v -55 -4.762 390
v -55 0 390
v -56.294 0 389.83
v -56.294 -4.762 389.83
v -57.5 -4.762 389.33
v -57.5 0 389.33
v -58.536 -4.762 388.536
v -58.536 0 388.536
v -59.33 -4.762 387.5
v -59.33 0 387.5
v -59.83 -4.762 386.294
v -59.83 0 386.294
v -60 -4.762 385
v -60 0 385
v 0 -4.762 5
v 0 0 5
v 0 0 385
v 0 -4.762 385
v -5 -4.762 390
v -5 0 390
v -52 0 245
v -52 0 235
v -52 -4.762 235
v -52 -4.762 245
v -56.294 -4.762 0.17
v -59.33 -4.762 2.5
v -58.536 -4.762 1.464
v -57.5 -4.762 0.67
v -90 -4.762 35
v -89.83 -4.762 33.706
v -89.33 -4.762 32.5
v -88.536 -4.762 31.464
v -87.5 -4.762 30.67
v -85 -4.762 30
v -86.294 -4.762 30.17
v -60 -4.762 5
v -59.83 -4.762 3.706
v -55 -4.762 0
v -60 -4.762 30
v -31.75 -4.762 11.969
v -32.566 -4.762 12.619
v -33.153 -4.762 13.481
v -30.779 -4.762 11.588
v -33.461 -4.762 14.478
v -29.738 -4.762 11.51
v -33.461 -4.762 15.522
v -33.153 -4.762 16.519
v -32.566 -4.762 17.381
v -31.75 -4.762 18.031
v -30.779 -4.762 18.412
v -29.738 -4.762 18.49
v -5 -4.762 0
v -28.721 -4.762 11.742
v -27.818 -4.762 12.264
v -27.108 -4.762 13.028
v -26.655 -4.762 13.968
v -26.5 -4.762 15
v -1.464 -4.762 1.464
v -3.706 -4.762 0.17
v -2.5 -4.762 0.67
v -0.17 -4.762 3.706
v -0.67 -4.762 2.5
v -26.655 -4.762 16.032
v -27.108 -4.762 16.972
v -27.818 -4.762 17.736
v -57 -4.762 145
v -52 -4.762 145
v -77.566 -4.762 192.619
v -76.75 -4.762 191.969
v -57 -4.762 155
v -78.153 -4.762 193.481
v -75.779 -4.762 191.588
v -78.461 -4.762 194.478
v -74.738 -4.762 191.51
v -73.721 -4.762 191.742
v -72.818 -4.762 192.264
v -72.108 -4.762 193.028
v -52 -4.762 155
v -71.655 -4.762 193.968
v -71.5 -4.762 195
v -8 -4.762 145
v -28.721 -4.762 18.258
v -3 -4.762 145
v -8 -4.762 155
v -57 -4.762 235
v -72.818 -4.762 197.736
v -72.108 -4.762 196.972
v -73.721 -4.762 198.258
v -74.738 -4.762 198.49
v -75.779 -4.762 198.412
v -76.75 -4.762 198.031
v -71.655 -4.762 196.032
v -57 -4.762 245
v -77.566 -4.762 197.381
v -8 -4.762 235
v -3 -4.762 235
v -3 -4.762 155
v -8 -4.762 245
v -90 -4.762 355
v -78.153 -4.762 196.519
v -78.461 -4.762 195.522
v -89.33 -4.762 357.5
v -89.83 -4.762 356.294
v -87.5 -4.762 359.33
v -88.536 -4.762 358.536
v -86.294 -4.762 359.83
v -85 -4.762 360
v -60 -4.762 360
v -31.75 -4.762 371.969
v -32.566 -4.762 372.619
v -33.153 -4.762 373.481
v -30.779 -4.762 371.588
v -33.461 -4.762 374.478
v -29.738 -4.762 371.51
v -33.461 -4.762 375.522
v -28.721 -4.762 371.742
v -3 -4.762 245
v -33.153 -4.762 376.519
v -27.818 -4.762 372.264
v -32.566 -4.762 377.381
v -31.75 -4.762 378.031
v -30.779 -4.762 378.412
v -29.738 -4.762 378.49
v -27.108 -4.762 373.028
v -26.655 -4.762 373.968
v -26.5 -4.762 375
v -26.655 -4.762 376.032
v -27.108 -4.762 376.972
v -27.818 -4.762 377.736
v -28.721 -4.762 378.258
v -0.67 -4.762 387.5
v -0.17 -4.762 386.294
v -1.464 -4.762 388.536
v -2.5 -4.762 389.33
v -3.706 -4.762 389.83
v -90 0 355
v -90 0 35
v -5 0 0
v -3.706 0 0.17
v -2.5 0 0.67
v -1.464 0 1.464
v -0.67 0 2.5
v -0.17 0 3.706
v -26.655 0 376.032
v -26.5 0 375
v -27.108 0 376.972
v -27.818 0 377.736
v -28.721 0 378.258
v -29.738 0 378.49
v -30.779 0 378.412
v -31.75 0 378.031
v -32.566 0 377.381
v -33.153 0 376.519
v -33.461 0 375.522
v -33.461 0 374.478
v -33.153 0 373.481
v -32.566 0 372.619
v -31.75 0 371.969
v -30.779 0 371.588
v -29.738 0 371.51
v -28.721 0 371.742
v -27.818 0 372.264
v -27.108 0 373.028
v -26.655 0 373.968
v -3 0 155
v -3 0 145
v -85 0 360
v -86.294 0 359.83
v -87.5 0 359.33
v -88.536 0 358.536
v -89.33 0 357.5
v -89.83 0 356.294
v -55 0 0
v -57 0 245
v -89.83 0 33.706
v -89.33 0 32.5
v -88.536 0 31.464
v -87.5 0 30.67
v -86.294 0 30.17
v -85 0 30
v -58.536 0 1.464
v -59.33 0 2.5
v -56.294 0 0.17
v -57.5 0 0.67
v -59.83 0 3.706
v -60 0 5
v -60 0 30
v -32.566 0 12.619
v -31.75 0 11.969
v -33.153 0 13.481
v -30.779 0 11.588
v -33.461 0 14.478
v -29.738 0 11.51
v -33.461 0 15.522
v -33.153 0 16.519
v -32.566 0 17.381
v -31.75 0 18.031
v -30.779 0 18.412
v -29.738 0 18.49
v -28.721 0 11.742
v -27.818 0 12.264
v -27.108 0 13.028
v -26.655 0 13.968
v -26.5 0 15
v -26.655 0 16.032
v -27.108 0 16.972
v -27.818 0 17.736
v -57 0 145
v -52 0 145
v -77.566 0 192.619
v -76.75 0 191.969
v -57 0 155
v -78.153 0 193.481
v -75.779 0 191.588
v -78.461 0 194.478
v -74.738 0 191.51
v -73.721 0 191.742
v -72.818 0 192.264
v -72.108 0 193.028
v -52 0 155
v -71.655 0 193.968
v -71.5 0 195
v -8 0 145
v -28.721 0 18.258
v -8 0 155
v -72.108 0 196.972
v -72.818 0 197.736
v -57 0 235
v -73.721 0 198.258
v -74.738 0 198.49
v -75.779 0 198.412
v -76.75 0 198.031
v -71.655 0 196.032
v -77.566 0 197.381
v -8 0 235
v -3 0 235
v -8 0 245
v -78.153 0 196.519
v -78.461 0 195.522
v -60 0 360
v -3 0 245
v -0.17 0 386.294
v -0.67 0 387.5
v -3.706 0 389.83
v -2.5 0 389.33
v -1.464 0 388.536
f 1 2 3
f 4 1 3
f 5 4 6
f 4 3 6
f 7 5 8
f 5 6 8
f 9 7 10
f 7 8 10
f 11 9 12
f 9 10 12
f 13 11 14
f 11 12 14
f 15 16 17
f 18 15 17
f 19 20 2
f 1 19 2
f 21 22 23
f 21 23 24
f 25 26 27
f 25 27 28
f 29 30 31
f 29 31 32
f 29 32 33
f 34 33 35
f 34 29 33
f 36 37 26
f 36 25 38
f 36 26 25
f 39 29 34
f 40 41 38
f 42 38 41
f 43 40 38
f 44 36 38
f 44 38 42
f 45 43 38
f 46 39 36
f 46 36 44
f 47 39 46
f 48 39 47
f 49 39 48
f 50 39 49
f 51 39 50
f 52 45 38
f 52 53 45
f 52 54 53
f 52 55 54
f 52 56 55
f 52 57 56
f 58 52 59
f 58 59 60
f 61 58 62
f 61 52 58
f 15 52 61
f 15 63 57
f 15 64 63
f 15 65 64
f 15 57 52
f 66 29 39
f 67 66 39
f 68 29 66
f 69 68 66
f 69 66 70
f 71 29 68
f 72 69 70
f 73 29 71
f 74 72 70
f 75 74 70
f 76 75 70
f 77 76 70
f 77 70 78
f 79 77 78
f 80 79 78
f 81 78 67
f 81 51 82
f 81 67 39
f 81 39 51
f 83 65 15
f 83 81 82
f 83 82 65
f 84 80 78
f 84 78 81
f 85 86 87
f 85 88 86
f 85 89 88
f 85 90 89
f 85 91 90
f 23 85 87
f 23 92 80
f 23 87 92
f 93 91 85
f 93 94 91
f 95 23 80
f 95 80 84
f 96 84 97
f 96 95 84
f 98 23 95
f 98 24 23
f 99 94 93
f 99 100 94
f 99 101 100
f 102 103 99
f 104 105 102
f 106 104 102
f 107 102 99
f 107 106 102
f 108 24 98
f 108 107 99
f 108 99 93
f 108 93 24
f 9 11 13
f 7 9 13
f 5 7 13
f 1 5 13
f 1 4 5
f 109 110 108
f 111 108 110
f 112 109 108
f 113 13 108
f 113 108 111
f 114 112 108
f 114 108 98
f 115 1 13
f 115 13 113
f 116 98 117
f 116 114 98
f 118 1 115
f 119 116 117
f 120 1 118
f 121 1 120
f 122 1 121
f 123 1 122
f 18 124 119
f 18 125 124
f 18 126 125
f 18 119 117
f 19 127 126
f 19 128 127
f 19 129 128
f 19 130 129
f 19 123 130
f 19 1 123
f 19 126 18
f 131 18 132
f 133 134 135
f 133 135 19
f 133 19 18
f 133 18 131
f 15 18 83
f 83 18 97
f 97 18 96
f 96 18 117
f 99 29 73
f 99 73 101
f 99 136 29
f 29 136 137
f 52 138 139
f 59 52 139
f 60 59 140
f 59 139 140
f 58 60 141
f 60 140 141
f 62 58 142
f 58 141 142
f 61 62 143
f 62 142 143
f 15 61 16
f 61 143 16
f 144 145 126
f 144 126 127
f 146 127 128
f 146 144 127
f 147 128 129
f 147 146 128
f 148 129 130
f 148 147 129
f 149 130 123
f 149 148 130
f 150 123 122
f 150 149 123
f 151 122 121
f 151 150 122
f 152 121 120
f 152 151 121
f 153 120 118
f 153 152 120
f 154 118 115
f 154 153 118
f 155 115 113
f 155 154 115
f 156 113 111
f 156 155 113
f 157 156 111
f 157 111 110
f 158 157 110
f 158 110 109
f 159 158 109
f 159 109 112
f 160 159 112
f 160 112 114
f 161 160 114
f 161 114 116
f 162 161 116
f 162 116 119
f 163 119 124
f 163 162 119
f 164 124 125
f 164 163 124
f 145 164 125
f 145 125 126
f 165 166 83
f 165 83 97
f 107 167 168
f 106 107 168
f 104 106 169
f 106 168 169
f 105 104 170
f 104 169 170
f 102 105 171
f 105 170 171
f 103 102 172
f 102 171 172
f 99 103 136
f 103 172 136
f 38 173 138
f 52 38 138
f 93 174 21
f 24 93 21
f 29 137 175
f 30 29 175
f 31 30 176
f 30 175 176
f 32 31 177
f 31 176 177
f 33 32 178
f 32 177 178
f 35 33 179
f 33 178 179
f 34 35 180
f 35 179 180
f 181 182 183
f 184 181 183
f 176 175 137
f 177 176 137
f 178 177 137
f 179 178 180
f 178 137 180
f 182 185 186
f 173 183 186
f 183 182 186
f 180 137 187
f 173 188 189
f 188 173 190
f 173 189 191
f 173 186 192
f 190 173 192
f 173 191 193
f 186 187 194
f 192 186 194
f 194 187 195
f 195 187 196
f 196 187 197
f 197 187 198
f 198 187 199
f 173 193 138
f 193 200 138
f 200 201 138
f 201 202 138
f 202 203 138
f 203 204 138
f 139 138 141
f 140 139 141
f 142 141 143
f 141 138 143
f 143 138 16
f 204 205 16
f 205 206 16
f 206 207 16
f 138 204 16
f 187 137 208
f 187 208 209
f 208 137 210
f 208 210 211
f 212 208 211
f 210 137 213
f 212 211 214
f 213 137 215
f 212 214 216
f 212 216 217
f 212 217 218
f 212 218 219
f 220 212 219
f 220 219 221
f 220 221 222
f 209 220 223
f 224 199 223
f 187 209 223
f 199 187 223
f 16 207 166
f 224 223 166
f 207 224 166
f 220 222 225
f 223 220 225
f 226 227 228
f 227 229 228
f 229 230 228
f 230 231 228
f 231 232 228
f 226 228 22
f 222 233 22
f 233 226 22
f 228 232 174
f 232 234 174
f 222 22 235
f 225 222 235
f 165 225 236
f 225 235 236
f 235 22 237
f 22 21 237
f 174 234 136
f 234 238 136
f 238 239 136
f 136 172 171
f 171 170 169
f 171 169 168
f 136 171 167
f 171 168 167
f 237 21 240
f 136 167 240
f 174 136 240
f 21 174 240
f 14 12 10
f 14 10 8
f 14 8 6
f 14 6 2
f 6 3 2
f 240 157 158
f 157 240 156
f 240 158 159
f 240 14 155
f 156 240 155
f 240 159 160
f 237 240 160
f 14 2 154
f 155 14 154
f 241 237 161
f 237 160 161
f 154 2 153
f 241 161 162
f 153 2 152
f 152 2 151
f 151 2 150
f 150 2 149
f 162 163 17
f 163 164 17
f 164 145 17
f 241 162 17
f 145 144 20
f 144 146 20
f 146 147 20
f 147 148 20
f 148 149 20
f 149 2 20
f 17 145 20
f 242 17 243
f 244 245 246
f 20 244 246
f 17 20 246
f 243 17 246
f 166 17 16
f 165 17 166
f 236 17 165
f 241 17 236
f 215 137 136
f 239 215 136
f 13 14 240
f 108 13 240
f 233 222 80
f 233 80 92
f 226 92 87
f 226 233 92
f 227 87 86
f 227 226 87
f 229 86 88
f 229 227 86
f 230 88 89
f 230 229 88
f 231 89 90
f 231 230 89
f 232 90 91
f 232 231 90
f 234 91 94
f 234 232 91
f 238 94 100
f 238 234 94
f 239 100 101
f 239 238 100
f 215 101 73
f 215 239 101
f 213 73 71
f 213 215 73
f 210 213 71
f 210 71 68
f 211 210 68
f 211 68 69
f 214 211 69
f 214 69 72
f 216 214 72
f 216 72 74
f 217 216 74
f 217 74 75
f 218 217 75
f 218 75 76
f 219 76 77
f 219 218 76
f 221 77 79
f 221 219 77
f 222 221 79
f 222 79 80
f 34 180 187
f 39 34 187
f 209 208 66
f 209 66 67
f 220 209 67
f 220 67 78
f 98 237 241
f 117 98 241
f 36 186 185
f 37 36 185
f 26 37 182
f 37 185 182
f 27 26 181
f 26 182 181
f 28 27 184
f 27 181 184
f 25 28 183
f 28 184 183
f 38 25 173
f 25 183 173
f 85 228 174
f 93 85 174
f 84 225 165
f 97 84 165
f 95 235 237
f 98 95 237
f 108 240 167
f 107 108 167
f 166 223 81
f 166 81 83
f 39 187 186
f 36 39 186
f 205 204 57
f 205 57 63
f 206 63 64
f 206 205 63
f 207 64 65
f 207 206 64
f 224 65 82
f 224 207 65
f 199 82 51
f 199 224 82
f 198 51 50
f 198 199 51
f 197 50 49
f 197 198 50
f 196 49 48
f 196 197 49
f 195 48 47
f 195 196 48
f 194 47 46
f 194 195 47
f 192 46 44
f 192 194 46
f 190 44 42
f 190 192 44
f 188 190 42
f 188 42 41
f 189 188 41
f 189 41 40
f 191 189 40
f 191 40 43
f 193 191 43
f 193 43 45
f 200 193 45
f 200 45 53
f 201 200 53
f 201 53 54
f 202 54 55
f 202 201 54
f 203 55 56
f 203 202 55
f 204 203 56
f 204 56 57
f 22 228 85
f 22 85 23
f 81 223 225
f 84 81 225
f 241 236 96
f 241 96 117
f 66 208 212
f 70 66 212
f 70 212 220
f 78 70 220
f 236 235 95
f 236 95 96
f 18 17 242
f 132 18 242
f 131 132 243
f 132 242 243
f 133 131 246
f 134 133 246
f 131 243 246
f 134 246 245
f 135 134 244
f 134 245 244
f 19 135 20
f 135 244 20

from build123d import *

# Parameters (mm, degrees)
F1_W     = 5
F1_H     = 10
F1_R     = 3.5
F2_DEPTH = 4.7625


# Not quite as in the source:
# - a length typed as a fraction of an inch, garbled in the dataset ("3 / 203.2 mm" for 3/8 in), is restored


with BuildPart() as f2:
    # F1 (on Front) → F2 (new body)
    with BuildSketch(Plane.XZ):
        with BuildLine():
            ThreePointArc((-5, 0), (-1.4644660941, 1.4644660941), (0, 5))
            Line((0, 5), (0, 385))
            ThreePointArc((0, 385), (-1.4644660941, 388.5355339059), (-5, 390))
            Line((-5, 390), (-55, 390))
            ThreePointArc((-55, 390), (-58.5355339059, 388.5355339059), (-60, 385))
            Line((-60, 385), (-60, 360))
            Line((-60, 360), (-85, 360))
            ThreePointArc((-85, 360), (-88.5355339059, 358.5355339059), (-90, 355))
            Line((-90, 355), (-90, 35))
            ThreePointArc((-90, 35), (-88.5355339059, 31.4644660941), (-85, 30))
            Line((-85, 30), (-60, 30))
            Line((-60, 30), (-60, 5))
            ThreePointArc((-60, 5), (-58.5355339059, 1.4644660941), (-55, 0))
            Line((-55, 0), (-5, 0))
        make_face()
        with Locations((-54.5, 150)):
            Rectangle(F1_W, F1_H, mode=Mode.SUBTRACT)
        with Locations((-30, 15)):
            Circle(F1_R, mode=Mode.SUBTRACT)
        with Locations((-5.5, 150)):
            Rectangle(F1_W, F1_H, mode=Mode.SUBTRACT)
        with Locations((-75, 195)):
            Circle(F1_R, mode=Mode.SUBTRACT)
        with Locations((-54.5, 240)):
            Rectangle(F1_W, F1_H, mode=Mode.SUBTRACT)
        with Locations((-5.5, 240)):
            Rectangle(F1_W, F1_H, mode=Mode.SUBTRACT)
        with Locations((-30, 375)):
            Circle(F1_R, mode=Mode.SUBTRACT)
    extrude(amount=F2_DEPTH)


solid = f2.part
